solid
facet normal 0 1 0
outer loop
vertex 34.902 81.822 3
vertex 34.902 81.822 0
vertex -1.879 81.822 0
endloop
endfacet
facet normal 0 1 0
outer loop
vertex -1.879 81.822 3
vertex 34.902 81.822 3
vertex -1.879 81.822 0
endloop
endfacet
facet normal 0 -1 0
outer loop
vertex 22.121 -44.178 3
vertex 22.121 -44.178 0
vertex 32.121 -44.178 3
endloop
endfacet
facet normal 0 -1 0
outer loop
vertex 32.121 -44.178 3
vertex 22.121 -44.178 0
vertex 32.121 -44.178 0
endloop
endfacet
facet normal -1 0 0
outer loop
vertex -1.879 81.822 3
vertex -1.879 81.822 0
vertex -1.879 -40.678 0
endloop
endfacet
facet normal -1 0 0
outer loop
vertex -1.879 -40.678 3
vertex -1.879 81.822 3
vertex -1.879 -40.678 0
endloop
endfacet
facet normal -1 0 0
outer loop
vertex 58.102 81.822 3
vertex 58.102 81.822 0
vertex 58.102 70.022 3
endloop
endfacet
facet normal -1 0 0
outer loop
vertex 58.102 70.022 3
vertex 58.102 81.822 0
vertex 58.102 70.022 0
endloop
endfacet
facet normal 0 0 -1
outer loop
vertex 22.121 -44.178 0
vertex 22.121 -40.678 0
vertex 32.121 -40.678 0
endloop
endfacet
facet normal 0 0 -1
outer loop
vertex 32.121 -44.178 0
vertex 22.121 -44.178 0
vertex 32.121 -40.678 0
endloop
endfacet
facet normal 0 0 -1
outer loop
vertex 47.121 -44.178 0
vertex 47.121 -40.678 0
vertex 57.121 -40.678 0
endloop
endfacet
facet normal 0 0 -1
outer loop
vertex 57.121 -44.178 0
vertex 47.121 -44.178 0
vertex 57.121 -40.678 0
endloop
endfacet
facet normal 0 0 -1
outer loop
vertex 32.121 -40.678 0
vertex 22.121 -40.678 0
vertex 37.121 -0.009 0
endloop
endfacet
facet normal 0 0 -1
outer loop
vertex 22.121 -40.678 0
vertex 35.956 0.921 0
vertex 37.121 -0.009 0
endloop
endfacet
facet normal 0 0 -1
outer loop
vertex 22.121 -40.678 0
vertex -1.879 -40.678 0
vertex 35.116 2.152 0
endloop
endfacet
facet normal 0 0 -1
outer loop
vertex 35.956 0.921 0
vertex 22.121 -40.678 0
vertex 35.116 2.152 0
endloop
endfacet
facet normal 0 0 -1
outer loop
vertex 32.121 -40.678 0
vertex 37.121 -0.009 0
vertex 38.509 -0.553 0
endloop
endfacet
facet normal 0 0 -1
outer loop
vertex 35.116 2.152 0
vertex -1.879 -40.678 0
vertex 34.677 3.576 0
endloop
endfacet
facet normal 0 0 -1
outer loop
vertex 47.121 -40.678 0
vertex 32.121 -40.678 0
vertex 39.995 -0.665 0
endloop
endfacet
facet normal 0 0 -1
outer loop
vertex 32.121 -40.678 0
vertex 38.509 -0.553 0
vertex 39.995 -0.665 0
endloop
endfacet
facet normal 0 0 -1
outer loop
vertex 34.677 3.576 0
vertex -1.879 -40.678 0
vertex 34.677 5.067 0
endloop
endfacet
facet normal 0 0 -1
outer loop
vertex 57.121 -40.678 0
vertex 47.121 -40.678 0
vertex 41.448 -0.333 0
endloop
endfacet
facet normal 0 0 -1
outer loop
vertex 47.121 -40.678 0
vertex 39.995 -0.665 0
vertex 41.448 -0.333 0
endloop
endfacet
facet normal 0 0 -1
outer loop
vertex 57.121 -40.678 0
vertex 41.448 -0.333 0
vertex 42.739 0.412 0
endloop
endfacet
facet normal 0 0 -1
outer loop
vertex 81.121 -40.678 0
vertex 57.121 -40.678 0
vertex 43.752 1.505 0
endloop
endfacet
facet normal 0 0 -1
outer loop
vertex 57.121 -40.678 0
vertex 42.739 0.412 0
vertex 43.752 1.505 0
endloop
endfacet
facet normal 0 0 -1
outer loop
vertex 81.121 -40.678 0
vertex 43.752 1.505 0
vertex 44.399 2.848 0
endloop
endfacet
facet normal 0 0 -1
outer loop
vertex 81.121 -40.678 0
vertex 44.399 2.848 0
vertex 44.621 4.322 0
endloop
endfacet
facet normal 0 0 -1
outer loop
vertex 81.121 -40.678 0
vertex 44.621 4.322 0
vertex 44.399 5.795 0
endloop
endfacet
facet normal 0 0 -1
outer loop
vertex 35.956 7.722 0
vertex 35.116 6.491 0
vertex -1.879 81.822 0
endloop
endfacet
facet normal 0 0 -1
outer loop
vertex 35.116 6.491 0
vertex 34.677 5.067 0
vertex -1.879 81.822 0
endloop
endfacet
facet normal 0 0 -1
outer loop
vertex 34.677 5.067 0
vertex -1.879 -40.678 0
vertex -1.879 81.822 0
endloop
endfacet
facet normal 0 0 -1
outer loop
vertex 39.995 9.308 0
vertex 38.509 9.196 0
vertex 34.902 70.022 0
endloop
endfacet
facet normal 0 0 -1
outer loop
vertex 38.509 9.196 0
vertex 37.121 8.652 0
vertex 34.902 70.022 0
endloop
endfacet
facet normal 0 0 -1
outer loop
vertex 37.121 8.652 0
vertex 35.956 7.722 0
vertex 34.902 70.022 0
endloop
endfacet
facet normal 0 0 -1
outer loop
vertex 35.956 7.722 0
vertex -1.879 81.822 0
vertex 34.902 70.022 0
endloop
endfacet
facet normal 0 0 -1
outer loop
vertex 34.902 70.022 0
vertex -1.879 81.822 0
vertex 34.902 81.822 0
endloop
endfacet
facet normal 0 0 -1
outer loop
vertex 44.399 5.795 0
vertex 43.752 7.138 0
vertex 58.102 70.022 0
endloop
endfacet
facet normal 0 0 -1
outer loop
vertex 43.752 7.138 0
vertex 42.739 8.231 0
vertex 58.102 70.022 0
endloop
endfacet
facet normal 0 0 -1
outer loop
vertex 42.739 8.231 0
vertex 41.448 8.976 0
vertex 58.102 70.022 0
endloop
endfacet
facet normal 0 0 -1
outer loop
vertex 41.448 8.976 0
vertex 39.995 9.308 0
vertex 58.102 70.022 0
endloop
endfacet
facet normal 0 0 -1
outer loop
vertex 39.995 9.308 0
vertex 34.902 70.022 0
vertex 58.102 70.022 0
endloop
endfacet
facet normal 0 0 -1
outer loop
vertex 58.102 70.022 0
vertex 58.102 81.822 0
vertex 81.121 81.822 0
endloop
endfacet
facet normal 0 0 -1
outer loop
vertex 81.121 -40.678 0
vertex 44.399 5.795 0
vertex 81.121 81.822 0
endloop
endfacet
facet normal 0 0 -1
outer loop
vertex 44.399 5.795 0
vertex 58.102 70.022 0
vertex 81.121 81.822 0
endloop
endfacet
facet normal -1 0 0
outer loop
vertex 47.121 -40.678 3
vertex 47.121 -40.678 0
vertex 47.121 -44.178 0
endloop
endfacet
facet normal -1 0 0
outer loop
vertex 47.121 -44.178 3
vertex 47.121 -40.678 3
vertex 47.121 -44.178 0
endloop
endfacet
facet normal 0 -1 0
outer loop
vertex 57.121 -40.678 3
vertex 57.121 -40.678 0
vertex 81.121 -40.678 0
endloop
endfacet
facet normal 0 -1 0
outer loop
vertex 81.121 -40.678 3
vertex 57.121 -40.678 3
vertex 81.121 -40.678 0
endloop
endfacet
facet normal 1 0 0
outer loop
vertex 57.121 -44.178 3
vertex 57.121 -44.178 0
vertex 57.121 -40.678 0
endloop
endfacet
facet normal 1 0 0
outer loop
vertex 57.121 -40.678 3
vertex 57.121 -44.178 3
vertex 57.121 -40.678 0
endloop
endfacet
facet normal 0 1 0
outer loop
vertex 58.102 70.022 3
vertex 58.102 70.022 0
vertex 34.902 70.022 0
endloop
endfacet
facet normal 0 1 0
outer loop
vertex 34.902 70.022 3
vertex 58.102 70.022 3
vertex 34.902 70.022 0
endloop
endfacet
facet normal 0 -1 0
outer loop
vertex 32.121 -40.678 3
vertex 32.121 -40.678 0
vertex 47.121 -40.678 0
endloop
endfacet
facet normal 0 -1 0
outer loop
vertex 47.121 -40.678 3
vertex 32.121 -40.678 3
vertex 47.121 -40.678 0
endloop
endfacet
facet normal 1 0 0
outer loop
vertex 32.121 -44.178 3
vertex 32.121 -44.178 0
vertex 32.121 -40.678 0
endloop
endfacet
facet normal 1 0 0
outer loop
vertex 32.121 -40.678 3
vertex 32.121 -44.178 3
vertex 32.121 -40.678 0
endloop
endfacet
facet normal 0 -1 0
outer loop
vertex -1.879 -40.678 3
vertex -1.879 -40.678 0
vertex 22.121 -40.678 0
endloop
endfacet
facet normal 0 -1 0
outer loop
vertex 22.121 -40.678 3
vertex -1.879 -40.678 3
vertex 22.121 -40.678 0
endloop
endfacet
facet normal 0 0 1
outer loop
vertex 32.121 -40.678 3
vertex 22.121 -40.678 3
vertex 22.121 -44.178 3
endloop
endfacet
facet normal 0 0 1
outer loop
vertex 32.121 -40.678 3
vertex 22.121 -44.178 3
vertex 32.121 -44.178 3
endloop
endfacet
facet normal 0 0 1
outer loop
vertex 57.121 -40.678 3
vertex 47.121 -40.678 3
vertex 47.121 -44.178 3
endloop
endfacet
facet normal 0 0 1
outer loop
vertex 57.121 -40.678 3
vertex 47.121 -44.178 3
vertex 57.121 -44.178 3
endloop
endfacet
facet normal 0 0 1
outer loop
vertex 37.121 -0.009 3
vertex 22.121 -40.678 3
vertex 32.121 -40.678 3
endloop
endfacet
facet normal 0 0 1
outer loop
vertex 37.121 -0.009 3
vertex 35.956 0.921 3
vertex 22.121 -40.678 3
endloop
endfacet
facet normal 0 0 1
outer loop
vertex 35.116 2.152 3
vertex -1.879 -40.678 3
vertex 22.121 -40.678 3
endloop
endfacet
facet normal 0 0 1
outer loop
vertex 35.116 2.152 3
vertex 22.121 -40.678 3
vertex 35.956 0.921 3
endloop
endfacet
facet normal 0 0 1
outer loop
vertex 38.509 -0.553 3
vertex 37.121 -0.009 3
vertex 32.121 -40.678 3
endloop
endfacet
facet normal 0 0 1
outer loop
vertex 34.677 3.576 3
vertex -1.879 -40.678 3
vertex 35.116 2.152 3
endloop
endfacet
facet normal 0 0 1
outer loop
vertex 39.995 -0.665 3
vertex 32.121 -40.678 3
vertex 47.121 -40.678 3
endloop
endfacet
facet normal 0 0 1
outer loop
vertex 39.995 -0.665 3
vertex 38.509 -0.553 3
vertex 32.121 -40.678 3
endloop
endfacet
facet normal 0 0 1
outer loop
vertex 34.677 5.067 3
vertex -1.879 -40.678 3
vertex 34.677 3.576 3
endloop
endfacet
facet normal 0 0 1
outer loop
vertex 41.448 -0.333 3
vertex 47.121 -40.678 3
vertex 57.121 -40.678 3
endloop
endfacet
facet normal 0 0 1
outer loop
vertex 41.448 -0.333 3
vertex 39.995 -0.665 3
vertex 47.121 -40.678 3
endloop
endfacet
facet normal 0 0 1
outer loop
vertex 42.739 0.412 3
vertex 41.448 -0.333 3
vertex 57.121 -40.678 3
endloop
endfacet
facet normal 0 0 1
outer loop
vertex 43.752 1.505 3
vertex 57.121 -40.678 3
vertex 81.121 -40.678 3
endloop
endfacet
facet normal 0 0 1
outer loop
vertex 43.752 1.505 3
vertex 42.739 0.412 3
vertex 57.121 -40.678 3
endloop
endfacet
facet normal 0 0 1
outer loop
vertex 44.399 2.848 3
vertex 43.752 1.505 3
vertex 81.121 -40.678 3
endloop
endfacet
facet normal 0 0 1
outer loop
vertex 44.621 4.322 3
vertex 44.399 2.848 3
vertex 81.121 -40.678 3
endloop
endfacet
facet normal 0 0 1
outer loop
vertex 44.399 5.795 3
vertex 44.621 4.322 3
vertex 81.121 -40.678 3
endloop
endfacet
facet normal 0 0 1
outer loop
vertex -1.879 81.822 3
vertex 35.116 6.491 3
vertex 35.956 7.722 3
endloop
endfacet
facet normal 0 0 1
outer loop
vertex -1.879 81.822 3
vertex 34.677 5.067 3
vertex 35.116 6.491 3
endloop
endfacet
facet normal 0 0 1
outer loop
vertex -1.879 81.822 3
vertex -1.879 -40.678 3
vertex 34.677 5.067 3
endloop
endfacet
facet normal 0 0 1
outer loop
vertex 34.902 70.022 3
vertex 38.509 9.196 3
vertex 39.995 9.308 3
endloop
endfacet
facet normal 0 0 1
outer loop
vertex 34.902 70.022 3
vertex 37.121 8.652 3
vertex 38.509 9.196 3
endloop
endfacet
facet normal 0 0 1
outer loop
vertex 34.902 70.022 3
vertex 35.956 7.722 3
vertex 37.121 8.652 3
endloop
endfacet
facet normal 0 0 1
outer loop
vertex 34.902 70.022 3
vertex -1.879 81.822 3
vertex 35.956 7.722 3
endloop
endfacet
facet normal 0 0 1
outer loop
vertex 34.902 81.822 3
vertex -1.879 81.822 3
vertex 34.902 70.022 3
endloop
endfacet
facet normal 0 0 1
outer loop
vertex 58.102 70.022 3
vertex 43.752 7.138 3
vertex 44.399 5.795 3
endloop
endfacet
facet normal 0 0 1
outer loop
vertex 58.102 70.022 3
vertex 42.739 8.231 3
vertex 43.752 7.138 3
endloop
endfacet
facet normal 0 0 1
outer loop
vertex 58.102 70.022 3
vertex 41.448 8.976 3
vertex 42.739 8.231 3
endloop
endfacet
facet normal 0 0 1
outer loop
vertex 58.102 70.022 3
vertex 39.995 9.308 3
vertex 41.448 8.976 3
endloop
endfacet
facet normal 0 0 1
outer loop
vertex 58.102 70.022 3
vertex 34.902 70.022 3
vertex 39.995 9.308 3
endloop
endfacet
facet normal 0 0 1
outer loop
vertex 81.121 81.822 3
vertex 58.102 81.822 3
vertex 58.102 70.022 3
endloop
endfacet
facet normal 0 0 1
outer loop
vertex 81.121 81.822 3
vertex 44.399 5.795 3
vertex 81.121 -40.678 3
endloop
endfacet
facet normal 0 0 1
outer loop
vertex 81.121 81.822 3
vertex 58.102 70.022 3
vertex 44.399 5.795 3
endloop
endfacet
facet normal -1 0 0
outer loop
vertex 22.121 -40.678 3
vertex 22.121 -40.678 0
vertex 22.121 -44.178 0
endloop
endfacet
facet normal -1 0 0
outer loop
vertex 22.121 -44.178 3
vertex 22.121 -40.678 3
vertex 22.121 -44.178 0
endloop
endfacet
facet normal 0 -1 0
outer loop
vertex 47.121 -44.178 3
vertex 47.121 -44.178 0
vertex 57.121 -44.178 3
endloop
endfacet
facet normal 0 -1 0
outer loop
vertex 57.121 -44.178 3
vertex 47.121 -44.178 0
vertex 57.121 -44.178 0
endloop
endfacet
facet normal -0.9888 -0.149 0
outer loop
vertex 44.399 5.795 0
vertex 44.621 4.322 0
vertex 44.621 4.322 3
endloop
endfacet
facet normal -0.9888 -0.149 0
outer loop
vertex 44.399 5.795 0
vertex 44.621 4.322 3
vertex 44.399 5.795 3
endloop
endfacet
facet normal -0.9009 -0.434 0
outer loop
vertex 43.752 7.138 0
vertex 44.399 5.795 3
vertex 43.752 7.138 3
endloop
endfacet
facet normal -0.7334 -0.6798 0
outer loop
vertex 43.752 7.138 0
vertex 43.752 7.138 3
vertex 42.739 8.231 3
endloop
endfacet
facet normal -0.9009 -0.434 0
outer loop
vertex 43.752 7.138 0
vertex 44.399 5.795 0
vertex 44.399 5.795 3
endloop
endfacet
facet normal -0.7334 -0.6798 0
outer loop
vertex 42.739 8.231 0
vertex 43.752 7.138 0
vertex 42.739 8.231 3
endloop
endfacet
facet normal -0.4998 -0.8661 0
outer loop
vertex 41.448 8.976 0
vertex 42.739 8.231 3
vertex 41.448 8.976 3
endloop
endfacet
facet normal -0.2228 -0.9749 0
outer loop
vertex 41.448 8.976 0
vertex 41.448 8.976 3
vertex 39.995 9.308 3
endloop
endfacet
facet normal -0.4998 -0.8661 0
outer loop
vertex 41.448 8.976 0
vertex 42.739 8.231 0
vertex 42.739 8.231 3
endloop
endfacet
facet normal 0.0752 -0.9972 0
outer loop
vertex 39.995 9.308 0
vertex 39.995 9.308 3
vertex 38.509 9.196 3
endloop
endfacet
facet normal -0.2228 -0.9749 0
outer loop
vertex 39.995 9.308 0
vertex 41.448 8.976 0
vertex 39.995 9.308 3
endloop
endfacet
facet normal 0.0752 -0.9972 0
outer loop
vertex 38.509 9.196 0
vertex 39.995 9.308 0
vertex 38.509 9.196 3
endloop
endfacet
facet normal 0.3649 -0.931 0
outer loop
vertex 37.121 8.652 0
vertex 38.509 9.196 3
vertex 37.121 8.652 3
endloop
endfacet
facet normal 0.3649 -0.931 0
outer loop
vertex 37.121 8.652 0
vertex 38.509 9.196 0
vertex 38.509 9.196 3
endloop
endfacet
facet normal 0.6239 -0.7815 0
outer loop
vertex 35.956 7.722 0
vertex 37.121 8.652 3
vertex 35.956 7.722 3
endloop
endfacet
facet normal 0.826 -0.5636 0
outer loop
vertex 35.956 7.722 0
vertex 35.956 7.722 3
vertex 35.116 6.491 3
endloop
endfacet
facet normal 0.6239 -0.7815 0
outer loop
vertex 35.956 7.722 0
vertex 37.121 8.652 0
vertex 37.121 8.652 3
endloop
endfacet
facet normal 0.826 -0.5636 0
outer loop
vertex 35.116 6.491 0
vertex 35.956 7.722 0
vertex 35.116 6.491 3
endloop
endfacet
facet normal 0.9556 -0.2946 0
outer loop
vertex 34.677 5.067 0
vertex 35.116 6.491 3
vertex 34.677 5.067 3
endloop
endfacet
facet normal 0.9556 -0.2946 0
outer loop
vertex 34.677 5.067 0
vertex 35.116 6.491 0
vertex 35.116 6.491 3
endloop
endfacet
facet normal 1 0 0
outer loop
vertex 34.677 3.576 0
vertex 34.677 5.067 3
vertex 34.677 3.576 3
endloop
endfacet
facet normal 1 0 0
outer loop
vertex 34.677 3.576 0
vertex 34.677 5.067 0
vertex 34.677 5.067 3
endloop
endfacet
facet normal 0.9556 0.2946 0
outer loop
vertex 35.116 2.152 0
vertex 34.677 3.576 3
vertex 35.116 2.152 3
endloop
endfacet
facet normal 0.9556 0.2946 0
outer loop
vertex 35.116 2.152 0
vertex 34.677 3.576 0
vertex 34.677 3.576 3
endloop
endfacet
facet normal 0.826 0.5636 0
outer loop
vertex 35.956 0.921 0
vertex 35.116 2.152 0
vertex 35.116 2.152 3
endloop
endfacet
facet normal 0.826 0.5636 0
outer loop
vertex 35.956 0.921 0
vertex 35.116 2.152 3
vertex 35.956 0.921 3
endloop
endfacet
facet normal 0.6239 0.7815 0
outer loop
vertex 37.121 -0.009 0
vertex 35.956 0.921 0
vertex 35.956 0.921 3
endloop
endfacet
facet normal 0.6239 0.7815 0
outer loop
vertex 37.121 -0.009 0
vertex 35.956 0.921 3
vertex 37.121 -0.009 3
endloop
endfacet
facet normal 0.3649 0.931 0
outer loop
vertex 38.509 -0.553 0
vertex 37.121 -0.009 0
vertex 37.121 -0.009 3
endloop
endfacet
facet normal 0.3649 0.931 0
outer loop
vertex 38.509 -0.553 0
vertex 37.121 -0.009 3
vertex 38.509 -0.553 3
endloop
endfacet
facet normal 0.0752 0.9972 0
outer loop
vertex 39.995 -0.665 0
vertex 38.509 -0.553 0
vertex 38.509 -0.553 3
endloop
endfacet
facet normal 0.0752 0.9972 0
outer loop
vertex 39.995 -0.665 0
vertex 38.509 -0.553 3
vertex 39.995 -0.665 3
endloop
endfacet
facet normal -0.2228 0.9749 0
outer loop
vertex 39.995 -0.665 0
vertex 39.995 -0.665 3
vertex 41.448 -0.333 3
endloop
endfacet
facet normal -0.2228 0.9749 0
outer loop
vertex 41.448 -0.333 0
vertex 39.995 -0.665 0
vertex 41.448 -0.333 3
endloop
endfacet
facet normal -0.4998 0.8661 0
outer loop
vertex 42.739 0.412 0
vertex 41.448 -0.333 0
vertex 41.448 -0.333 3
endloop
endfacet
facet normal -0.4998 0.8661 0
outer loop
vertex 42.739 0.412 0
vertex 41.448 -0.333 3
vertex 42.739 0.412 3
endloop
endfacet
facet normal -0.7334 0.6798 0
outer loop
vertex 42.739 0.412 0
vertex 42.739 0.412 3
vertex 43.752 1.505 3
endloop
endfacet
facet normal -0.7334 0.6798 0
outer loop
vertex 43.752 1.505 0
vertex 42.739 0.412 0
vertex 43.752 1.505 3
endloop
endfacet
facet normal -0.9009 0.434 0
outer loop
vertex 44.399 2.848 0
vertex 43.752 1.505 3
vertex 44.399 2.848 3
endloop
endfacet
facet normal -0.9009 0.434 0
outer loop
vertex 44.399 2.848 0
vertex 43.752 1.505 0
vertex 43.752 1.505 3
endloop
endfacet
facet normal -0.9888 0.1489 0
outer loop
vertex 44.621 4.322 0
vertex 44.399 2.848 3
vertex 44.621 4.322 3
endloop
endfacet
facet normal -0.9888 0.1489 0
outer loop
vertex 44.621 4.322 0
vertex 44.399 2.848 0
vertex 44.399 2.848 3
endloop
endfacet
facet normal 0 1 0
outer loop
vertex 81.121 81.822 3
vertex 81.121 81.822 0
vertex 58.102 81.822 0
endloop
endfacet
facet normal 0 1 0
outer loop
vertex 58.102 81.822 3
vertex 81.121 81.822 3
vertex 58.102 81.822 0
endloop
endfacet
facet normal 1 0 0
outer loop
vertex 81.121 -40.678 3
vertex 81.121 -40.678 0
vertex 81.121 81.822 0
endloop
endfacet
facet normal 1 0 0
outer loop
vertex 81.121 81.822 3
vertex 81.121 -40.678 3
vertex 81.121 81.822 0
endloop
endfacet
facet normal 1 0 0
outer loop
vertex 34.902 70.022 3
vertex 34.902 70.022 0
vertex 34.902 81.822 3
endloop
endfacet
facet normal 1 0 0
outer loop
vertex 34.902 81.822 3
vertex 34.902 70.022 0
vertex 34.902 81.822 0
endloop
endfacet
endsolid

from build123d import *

# Parameters (mm, degrees)
MODEL_R                 = 5
SALIENTE_EXTRUIR1_DEPTH = 3


with BuildPart() as part:
    # Model → Saliente-Extruir1 (new body)
    with BuildSketch(Plane.XY):
        Polygon((81.121222681, 81.82151488), (70.11183083, 81.82151488), (58.10243898, 81.82151488), (58.10243898, 70.02151488), (34.90243898, 70.02151488), (34.90243898, 81.82151488), (19.694696617, 81.82151488), (-1.878778155, 81.82151488), (-1.878778155, -40.67848512), (22.121222263, -40.67848512), (22.121222263, -44.17848512), (32.121222263, -44.17848512), (32.121222263, -40.67848512), (47.121222263, -40.67848512), (47.121222263, -44.17848512), (57.121222263, -44.17848512), (57.121222263, -40.67848512), (81.121222681, -40.67848512), align=None)
        with Locations((39.621222681, 4.32151488)):
            Circle(MODEL_R, mode=Mode.SUBTRACT)
    extrude(amount=SALIENTE_EXTRUIR1_DEPTH)


solid = part.part
